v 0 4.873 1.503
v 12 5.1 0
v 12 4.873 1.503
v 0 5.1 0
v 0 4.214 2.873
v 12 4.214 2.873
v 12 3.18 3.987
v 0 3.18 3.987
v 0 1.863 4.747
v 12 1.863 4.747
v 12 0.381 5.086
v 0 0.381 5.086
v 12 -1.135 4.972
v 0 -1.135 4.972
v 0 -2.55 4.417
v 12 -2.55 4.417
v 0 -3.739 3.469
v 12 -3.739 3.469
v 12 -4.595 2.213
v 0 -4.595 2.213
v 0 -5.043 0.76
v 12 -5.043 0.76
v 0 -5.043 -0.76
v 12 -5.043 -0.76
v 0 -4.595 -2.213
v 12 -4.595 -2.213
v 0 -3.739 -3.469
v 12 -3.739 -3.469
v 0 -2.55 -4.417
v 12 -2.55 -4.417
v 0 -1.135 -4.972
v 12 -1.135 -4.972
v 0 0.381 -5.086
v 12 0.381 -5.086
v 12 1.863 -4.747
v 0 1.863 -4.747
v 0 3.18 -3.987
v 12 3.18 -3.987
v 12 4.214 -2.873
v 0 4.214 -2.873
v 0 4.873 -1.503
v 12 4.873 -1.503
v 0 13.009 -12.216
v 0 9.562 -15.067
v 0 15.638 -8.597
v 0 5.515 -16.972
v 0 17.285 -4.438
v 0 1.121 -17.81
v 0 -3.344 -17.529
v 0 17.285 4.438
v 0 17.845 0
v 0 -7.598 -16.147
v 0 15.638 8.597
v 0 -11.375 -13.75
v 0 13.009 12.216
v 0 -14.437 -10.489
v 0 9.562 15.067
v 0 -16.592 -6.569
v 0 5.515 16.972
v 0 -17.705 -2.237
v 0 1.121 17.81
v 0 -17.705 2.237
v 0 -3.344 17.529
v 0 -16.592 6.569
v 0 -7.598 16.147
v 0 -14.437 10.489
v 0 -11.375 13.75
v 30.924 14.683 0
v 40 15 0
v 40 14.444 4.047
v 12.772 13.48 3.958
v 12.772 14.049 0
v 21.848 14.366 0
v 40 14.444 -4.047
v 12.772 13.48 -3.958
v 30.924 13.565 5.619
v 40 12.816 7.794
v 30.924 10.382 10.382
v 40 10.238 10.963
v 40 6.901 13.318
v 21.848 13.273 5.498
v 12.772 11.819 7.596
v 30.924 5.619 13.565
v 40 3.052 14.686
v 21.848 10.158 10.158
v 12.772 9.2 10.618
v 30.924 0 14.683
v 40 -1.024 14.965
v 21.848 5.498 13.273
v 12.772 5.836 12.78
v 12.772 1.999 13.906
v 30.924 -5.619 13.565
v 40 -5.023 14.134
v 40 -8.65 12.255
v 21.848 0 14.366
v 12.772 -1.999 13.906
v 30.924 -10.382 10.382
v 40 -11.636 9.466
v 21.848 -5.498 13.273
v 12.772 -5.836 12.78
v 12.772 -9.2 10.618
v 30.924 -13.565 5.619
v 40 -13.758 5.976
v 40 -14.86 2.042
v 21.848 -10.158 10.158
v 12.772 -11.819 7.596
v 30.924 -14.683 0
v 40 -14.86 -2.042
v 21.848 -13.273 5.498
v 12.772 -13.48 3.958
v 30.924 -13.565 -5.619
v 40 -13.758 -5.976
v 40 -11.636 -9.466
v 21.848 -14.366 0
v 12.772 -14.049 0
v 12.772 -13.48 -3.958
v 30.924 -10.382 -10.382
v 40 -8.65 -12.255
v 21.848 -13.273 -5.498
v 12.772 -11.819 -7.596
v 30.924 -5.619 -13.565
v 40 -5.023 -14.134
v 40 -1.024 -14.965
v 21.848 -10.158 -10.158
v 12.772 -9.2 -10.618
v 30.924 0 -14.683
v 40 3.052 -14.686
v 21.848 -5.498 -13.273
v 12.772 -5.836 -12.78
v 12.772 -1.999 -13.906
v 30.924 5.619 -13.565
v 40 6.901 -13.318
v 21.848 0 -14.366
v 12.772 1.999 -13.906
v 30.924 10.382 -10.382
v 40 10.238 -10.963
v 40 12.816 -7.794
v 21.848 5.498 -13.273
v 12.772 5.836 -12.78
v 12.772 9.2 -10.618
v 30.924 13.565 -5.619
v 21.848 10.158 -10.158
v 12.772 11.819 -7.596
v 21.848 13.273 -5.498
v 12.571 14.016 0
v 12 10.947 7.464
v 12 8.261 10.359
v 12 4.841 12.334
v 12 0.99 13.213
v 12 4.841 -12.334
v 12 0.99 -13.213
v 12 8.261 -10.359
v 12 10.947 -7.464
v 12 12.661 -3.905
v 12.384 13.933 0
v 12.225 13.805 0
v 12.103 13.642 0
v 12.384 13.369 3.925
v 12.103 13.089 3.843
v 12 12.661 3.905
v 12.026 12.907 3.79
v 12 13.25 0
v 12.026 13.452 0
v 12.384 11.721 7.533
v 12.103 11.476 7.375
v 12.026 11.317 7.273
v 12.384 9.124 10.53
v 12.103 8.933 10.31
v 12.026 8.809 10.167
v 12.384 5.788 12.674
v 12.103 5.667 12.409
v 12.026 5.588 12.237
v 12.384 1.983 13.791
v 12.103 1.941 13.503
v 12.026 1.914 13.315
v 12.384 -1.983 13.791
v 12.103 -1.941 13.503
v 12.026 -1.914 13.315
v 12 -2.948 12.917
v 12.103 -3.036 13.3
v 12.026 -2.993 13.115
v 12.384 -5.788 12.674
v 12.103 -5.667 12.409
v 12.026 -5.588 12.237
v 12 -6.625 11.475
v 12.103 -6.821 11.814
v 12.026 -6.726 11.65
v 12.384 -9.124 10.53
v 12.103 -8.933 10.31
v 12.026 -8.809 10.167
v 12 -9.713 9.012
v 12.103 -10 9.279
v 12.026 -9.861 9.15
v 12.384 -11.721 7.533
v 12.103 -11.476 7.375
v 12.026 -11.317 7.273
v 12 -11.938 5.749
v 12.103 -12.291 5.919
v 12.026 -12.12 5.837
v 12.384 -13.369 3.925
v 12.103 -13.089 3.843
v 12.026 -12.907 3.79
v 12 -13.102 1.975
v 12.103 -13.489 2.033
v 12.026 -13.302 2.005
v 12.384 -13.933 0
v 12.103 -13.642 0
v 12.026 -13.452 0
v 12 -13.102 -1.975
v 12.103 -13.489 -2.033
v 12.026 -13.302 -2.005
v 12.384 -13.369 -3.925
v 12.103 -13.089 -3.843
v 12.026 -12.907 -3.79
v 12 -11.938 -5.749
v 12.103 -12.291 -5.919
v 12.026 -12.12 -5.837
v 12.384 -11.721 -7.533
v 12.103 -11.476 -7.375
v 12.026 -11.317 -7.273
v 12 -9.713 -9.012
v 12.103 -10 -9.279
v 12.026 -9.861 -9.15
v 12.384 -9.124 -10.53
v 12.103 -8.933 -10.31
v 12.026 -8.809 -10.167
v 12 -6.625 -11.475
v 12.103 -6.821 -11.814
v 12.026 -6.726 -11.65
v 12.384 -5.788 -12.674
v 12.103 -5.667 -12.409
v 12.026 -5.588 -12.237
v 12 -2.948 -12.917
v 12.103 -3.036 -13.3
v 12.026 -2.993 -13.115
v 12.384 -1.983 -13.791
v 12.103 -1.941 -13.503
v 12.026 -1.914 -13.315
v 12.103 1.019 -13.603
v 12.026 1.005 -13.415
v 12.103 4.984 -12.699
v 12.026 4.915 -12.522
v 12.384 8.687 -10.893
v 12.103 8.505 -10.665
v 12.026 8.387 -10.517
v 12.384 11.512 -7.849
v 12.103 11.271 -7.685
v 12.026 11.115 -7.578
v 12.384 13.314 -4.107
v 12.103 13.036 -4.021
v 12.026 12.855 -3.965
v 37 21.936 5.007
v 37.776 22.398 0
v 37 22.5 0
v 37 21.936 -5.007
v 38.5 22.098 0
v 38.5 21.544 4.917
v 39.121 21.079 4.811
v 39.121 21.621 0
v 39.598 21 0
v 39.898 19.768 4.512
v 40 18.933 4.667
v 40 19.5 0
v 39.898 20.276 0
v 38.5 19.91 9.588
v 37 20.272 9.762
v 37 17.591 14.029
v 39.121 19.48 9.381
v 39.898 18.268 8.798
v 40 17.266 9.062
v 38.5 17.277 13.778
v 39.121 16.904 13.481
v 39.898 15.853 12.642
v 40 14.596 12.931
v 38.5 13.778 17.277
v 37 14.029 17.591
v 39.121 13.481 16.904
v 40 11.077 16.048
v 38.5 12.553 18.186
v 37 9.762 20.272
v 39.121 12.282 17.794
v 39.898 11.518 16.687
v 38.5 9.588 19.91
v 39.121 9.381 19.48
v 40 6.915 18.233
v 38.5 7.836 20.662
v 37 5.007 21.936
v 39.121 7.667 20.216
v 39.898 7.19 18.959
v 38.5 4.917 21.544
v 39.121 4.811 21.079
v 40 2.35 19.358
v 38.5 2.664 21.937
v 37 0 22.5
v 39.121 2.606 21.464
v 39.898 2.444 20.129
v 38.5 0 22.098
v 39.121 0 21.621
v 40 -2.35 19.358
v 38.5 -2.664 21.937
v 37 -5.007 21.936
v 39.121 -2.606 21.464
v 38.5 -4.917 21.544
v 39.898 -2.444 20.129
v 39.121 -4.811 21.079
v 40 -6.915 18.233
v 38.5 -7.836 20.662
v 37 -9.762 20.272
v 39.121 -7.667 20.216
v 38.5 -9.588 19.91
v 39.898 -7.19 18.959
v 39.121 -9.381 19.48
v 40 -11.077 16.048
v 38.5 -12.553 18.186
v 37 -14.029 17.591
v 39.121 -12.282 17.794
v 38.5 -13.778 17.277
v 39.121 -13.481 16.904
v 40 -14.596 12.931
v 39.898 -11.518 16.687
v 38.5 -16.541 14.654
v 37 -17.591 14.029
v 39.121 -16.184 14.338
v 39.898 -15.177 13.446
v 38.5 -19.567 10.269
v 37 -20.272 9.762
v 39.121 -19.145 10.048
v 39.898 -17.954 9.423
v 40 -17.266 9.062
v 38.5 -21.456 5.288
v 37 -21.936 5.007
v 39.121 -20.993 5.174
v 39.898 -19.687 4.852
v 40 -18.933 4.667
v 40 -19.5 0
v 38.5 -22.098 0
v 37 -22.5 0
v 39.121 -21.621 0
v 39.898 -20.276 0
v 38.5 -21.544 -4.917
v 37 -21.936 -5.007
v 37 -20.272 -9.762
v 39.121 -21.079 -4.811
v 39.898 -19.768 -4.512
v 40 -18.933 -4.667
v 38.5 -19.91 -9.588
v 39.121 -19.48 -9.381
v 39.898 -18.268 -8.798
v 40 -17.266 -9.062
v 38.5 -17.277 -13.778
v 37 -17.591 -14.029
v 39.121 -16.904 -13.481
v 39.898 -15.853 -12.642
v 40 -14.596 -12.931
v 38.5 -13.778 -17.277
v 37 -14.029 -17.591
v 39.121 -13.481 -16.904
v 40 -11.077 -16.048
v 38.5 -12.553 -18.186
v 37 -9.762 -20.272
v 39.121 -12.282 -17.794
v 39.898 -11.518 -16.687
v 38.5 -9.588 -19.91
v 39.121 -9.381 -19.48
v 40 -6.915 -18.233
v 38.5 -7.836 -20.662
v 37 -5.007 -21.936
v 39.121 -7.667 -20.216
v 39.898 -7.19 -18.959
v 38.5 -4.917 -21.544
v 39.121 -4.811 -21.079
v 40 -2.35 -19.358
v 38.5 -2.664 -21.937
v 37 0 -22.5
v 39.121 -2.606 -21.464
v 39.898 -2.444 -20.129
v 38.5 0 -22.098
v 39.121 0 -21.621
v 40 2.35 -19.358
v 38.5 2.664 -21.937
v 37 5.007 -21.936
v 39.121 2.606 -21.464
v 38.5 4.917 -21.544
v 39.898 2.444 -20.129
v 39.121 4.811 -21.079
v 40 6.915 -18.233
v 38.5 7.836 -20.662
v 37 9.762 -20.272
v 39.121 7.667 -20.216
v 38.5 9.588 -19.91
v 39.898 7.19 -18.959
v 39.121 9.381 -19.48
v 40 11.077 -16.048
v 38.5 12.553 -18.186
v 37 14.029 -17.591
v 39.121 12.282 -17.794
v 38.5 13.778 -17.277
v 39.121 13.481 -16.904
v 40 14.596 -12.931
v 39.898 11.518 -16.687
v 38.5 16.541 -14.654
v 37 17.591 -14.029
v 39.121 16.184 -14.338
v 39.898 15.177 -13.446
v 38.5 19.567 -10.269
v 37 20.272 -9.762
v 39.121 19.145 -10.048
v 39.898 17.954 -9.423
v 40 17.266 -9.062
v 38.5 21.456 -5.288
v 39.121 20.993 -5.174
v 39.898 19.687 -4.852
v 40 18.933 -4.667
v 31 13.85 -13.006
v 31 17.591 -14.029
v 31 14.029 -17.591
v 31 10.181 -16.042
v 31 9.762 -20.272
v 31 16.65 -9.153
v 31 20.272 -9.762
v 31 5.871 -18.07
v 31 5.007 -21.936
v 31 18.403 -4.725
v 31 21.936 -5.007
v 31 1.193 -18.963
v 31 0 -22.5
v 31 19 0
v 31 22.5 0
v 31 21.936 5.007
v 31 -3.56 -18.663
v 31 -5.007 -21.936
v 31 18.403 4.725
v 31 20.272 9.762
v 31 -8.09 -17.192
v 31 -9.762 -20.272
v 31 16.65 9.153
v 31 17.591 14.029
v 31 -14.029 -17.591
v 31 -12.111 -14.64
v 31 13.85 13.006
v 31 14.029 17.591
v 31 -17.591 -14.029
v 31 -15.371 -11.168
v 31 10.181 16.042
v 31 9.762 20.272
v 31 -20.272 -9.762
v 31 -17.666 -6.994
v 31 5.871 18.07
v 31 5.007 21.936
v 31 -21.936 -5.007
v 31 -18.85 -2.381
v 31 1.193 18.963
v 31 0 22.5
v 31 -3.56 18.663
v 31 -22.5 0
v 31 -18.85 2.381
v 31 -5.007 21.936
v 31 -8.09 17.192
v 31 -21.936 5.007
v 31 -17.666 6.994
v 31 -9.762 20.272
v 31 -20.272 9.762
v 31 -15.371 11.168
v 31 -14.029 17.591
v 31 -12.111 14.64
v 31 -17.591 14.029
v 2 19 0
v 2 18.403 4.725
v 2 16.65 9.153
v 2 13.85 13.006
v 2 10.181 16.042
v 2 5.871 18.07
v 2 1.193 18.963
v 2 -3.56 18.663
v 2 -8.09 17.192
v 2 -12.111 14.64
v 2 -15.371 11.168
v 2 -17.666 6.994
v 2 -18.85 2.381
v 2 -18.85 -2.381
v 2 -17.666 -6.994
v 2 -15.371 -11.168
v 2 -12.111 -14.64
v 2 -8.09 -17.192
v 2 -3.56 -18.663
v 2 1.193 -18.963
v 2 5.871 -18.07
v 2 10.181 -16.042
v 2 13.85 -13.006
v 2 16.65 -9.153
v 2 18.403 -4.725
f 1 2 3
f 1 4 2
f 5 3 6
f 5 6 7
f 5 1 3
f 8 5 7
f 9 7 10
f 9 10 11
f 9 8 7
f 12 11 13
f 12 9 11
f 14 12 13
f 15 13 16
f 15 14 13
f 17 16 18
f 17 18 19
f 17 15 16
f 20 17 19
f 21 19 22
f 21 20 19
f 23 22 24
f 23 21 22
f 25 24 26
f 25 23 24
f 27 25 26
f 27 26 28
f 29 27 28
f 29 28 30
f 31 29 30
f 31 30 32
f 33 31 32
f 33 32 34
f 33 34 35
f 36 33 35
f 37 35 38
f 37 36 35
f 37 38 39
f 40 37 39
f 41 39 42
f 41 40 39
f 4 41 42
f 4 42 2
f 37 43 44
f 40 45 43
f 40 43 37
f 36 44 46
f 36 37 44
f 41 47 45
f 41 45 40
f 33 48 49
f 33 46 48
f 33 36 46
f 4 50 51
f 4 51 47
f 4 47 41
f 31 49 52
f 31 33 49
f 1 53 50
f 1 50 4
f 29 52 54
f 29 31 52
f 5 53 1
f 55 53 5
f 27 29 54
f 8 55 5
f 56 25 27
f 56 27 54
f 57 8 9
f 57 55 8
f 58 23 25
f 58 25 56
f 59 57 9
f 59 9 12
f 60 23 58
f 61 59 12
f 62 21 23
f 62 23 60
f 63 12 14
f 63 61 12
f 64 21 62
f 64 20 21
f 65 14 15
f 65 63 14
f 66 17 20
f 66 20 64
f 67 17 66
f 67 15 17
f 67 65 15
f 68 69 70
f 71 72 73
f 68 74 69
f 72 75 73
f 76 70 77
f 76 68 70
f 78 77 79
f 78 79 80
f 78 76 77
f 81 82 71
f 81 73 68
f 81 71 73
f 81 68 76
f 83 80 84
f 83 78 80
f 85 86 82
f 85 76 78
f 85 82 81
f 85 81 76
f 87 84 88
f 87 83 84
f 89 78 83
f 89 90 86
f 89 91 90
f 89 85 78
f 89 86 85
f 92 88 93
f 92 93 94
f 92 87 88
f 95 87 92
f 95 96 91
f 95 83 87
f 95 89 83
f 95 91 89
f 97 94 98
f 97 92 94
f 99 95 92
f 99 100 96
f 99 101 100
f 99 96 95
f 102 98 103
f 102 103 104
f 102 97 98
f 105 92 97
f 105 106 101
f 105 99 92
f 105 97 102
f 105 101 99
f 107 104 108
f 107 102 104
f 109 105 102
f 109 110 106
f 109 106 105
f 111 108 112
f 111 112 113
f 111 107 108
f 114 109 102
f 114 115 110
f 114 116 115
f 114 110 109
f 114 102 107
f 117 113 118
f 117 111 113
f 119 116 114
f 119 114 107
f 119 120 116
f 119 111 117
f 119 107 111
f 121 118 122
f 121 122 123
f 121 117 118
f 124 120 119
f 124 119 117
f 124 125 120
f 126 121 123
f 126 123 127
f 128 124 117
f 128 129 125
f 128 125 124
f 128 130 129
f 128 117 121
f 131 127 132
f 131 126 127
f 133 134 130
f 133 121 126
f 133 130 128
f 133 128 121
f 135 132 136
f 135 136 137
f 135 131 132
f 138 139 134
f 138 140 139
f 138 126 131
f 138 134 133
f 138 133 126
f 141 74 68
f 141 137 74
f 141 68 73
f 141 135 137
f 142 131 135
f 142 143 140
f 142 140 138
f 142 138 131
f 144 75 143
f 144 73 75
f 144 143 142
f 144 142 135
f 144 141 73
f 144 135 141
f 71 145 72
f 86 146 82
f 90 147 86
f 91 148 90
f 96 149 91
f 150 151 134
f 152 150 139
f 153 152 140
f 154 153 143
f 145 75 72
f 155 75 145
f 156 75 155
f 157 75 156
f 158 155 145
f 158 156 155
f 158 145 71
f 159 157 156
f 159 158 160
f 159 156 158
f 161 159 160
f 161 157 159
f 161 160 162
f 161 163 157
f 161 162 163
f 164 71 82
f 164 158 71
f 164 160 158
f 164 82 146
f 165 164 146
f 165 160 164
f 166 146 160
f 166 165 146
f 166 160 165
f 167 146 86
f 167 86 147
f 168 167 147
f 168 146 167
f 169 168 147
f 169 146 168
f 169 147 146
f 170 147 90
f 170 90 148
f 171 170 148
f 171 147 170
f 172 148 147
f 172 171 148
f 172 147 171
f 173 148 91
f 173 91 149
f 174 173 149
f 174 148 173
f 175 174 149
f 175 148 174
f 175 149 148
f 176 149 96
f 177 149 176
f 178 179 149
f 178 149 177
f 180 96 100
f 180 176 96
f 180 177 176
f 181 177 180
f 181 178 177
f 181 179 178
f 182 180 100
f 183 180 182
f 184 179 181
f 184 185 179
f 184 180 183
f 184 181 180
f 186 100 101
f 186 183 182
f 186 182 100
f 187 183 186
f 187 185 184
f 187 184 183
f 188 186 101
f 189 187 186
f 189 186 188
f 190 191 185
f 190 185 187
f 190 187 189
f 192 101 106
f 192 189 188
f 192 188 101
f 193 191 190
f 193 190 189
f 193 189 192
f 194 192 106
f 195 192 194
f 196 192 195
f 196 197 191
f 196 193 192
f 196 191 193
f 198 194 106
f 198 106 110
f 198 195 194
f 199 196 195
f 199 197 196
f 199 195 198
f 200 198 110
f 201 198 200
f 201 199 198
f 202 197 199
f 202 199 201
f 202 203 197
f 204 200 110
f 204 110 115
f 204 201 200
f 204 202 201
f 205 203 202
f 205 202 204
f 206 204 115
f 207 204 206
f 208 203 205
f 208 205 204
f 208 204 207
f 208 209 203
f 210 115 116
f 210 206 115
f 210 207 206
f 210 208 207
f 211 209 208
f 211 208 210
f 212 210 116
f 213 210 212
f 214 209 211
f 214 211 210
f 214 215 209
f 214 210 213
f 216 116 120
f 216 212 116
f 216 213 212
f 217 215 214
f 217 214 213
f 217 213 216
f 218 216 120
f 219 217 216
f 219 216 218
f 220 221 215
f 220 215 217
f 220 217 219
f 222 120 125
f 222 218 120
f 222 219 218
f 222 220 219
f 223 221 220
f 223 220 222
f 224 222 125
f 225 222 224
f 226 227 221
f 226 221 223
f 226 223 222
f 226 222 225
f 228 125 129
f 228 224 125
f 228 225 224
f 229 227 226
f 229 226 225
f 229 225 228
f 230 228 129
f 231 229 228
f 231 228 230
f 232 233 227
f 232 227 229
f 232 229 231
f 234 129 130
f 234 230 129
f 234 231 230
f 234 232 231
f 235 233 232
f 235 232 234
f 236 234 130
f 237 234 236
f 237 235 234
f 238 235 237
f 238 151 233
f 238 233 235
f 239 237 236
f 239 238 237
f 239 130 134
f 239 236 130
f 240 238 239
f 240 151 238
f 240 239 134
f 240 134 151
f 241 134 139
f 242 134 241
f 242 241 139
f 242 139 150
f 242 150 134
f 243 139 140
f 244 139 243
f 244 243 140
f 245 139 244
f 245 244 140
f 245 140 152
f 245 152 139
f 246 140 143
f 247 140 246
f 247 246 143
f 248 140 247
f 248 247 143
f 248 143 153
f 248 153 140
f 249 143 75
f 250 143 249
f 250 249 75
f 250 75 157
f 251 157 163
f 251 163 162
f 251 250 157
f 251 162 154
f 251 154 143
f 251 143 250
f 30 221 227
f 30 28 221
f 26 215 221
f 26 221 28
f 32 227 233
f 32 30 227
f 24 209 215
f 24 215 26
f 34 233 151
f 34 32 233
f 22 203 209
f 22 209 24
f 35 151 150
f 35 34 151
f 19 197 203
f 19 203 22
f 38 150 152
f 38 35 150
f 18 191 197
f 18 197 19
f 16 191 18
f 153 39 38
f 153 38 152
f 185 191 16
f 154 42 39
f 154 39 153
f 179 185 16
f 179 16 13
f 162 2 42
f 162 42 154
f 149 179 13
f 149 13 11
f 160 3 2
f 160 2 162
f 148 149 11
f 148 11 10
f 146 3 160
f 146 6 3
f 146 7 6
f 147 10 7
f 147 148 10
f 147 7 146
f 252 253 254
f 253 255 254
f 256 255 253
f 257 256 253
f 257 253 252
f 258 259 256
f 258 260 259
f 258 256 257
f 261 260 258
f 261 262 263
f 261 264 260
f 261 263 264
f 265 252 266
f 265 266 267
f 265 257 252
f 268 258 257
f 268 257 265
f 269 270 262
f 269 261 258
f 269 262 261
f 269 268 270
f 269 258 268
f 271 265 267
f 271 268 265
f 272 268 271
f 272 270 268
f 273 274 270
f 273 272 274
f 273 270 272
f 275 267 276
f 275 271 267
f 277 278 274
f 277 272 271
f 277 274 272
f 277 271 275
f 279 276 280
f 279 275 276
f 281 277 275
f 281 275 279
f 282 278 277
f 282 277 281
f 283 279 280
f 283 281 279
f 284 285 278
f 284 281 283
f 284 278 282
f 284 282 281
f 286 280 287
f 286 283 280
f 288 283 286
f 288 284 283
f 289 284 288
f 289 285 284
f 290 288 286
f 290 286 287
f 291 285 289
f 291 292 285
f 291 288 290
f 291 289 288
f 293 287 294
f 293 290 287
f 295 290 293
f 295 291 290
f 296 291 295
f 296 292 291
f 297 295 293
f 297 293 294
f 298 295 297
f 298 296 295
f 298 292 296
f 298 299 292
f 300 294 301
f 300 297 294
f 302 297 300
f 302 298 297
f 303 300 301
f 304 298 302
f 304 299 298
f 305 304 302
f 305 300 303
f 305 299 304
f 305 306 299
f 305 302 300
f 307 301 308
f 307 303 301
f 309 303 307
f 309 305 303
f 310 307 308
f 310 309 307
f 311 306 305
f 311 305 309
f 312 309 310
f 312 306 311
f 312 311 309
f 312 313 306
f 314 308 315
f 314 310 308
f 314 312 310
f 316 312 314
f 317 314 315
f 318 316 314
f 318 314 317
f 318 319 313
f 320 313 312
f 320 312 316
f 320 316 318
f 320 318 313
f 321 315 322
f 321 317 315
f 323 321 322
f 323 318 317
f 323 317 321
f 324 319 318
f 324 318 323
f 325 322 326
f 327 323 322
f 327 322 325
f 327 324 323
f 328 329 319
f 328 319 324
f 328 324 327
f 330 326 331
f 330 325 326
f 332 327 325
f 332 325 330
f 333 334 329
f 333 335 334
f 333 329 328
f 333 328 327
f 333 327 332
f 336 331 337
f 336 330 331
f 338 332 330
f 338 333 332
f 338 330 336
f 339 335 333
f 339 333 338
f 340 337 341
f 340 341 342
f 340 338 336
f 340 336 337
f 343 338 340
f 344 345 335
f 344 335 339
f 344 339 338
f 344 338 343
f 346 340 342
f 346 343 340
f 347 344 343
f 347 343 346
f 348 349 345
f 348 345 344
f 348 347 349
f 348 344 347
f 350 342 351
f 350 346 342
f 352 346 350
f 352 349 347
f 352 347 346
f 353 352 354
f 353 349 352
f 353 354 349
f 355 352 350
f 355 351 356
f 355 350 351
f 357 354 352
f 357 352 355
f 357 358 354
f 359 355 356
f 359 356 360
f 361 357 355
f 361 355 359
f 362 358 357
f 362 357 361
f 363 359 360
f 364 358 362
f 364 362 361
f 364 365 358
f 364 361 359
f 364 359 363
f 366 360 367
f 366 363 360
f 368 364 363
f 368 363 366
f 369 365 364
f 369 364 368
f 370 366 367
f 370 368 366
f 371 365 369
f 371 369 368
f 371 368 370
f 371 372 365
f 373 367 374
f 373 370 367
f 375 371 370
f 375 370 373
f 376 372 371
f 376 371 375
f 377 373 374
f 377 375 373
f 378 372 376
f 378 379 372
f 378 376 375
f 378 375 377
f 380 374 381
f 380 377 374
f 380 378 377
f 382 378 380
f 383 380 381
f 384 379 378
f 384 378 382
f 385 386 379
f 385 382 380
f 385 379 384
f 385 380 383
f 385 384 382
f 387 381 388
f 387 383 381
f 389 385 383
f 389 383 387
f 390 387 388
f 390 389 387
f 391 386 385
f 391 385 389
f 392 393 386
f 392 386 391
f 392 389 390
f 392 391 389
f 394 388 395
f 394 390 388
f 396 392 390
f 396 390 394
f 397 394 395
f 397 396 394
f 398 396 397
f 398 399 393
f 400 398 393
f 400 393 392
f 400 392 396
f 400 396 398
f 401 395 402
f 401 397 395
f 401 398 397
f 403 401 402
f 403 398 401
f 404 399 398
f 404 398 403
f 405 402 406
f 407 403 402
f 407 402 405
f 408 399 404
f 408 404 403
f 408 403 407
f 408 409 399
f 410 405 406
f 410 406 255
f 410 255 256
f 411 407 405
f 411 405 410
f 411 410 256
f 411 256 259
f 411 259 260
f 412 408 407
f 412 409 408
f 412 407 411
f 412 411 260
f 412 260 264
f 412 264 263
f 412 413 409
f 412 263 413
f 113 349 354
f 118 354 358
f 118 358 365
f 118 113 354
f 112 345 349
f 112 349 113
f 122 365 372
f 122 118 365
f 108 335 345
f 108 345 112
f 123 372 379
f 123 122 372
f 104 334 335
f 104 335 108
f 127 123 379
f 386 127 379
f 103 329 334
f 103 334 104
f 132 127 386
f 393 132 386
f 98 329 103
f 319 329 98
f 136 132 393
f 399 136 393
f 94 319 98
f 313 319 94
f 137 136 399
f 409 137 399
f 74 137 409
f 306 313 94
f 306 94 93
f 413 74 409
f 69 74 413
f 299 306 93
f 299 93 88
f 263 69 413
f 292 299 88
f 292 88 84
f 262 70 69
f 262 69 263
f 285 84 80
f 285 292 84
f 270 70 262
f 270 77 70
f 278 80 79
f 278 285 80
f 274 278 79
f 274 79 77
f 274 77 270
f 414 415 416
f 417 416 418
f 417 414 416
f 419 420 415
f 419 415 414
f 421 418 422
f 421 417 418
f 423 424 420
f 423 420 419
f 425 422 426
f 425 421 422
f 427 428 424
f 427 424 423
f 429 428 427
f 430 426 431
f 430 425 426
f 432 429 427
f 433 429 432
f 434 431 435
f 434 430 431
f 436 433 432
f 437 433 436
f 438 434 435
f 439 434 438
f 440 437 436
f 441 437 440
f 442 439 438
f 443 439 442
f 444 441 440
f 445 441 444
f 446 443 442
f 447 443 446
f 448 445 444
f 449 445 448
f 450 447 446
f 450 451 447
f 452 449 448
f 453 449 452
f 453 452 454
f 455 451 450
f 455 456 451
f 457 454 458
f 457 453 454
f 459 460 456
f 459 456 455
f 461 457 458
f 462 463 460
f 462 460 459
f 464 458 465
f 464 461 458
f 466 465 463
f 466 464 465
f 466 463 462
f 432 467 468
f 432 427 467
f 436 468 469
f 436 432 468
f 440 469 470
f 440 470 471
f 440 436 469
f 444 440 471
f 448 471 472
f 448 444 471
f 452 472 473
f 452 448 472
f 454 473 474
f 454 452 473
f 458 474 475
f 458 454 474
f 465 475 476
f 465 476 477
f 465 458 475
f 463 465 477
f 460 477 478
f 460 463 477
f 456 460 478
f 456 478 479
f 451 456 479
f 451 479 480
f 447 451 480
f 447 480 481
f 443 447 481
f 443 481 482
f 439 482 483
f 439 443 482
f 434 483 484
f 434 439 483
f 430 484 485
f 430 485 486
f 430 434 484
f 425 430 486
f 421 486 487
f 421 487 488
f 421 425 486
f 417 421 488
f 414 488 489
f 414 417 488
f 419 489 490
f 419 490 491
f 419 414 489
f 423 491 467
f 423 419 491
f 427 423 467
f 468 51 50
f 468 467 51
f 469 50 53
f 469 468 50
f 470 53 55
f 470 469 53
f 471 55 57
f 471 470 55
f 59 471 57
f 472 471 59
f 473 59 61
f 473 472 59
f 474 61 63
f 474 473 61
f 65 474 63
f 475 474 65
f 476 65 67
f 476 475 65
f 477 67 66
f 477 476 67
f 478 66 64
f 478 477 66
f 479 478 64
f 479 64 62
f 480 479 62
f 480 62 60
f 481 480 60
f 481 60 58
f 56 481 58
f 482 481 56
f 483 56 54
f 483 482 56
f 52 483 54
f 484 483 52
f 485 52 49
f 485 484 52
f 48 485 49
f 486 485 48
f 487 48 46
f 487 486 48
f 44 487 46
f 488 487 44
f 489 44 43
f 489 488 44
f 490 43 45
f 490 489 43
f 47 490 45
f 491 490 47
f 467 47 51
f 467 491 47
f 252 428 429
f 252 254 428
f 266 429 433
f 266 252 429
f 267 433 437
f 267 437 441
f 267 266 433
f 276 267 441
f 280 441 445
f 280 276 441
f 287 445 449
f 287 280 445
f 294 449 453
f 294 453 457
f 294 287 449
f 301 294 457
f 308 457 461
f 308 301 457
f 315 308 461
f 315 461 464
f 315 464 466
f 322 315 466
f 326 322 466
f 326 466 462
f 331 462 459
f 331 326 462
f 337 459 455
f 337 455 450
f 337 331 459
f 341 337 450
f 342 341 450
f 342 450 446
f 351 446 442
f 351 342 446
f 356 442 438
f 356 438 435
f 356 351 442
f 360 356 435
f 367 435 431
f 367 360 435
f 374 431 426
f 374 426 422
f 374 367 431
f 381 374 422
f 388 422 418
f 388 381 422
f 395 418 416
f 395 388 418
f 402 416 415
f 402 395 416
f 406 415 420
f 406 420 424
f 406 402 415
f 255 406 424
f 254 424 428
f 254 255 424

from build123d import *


with BuildPart() as part:
    # Sketch1 → Revolve1 (revolve)
    with BuildSketch(Plane.XY):
        with BuildLine():
            Line((0, 17.845299462), (2, 19))
            Line((2, 19), (31, 19))
            Line((31, 19), (31, 22.5))
            Line((31, 22.5), (37, 22.5))
            ThreePointArc((37, 22.5), (39.121320344, 21.621320344), (40, 19.5))
            Line((40, 19.5), (40, 15))
            Line((40, 15), (12.772080403, 14.049180096))
            ThreePointArc((12.772080403, 14.049180096), (12.22452816, 13.805394131), (12, 13.249667434))
            Line((12, 13.249667434), (12, 5.1))
            Line((12, 5.1), (0, 5.1))
            Line((0, 5.1), (0, 17.845299462))
        make_face()
    revolve(axis=Axis((0, 0, 0), (1, 0, 0)))


solid = part.part
